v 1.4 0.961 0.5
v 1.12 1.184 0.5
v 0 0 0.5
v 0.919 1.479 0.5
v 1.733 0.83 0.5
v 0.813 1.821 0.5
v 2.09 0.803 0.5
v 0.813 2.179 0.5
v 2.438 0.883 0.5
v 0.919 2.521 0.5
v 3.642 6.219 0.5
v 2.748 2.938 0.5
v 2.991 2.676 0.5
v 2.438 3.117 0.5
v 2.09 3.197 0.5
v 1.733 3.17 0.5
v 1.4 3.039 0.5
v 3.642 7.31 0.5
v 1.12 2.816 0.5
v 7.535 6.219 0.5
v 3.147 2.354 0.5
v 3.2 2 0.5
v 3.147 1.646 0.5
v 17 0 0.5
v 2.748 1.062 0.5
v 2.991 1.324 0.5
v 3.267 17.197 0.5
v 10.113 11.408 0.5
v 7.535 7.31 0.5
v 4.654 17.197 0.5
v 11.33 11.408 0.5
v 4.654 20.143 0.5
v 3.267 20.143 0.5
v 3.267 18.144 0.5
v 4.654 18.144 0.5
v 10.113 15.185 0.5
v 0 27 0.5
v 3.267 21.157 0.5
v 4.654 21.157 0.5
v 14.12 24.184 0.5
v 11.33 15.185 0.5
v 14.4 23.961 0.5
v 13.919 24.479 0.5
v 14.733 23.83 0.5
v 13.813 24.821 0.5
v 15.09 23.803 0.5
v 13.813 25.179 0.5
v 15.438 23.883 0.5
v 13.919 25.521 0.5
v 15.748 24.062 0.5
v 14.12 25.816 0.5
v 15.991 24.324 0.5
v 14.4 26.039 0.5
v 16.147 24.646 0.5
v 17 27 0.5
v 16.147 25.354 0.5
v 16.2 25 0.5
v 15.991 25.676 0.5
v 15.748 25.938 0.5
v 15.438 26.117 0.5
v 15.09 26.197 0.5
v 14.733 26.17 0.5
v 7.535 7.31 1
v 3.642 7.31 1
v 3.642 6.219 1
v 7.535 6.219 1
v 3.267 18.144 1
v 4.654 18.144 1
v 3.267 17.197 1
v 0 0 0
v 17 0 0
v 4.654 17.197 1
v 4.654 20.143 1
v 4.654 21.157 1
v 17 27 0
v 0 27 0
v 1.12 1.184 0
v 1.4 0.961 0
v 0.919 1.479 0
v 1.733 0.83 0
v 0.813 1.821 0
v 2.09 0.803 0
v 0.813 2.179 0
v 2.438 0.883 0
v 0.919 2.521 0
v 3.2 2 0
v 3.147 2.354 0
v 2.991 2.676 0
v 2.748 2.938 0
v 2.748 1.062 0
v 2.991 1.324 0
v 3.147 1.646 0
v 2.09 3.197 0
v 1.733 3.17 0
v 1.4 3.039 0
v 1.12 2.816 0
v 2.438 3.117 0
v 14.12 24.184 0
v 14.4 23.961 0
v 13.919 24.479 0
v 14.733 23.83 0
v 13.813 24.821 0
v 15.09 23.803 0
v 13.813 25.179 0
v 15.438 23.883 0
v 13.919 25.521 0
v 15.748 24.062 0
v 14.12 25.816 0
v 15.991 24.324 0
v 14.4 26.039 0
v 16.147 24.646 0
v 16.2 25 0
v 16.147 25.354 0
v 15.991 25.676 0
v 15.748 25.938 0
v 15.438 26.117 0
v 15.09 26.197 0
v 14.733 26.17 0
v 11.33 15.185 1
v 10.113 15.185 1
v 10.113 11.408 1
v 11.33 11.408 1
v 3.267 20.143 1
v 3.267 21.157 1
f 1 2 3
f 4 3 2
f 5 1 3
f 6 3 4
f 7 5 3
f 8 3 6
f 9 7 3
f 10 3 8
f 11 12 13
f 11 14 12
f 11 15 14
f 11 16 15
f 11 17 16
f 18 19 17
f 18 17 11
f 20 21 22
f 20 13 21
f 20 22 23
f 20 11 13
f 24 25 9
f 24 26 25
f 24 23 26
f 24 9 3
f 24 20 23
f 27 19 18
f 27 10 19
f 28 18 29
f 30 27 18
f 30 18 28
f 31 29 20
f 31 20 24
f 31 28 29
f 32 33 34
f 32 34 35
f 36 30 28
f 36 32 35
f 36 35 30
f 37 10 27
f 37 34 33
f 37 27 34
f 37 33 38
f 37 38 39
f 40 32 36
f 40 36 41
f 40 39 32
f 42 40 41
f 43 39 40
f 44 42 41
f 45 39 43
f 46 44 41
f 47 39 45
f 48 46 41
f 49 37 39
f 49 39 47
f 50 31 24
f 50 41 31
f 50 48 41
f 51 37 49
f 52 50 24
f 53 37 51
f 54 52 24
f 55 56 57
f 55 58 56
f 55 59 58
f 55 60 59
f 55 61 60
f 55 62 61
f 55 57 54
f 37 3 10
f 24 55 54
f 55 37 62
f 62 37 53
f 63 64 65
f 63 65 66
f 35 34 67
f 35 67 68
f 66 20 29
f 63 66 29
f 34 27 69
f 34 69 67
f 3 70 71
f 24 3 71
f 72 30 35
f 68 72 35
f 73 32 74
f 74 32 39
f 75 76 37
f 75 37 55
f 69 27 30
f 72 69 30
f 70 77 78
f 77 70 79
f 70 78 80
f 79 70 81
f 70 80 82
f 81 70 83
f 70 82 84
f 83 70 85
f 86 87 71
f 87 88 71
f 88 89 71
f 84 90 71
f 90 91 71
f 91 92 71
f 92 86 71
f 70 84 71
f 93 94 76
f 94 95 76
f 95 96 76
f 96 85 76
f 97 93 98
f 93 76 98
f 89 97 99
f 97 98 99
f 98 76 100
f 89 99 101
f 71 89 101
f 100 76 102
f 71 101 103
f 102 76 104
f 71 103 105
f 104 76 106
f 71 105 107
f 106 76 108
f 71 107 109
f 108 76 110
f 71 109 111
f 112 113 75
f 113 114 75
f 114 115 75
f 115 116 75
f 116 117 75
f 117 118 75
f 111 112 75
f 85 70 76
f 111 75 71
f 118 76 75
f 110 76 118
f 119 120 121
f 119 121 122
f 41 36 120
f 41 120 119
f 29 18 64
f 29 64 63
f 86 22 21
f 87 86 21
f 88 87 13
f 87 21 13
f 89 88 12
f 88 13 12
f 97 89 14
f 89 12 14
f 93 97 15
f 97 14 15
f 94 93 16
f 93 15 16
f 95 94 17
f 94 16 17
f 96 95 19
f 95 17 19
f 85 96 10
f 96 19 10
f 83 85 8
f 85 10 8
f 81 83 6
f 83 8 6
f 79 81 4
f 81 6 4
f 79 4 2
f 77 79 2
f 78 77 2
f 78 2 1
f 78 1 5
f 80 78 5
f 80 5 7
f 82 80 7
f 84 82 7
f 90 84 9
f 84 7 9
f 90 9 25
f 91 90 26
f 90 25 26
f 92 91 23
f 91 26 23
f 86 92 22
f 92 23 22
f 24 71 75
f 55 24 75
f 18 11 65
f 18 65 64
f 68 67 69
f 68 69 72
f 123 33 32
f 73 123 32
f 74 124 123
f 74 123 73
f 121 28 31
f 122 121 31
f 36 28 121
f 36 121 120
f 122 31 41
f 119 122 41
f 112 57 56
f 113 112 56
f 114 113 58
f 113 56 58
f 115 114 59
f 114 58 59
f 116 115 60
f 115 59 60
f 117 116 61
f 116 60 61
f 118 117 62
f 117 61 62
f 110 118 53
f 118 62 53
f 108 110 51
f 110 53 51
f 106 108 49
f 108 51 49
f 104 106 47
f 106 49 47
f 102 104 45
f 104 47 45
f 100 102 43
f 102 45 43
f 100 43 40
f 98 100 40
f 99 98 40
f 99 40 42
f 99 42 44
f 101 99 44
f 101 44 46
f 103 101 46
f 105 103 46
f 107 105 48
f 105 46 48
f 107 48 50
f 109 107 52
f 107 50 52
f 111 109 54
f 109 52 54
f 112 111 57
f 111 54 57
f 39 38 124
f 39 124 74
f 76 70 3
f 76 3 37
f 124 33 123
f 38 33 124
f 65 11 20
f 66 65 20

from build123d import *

# Parameters (mm, degrees)
CROQUIS1_W              = 17
CROQUIS1_H              = 27
SALIENTE_EXTRUIR1_DEPTH = 0.5
CROQUIS2_R              = 1.2
CORTAR_EXTRUIR1_DEPTH   = 0.5
CROQUIS3_W              = 1.387036679
CROQUIS3_H              = 1.014497707
CROQUIS3_H_2            = 0.94749306
CROQUIS3_W_2            = 1.216641307
CROQUIS3_H_3            = 3.776719189
CROQUIS3_W_3            = 3.892395648
CROQUIS3_H_4            = 1.091909055
SALIENTE_EXTRUIR2_DEPTH = 0.5


with BuildPart() as part:
    # Croquis1 → Saliente-Extruir1 (new body)
    with BuildSketch(Plane.XY):
        with Locations((8.5, 13.5)):
            Rectangle(CROQUIS1_W, CROQUIS1_H)
    extrude(amount=SALIENTE_EXTRUIR1_DEPTH)

    # Croquis2 → Cortar-Extruir1 (cut)
    with BuildSketch(Plane.XY.offset(0.5)):
        with Locations((2, 2)):
            Circle(CROQUIS2_R)
        with Locations((15, 25)):
            Circle(CROQUIS2_R)
    extrude(amount=-CORTAR_EXTRUIR1_DEPTH, mode=Mode.SUBTRACT)

    # Croquis3 → Saliente-Extruir2 (add)
    with BuildSketch(Plane.XY.offset(0.5)):
        with Locations((3.960596796, 20.650173654)):
            Rectangle(CROQUIS3_W, CROQUIS3_H)
        with Locations((3.960596796, 17.670424265)):
            Rectangle(CROQUIS3_W, CROQUIS3_H_2)
        with Locations((10.721614084, 13.296281172)):
            Rectangle(CROQUIS3_W_2, CROQUIS3_H_3)
        with Locations((5.588615761, 6.764486289)):
            Rectangle(CROQUIS3_W_3, CROQUIS3_H_4)
    extrude(amount=SALIENTE_EXTRUIR2_DEPTH)


solid = part.part
